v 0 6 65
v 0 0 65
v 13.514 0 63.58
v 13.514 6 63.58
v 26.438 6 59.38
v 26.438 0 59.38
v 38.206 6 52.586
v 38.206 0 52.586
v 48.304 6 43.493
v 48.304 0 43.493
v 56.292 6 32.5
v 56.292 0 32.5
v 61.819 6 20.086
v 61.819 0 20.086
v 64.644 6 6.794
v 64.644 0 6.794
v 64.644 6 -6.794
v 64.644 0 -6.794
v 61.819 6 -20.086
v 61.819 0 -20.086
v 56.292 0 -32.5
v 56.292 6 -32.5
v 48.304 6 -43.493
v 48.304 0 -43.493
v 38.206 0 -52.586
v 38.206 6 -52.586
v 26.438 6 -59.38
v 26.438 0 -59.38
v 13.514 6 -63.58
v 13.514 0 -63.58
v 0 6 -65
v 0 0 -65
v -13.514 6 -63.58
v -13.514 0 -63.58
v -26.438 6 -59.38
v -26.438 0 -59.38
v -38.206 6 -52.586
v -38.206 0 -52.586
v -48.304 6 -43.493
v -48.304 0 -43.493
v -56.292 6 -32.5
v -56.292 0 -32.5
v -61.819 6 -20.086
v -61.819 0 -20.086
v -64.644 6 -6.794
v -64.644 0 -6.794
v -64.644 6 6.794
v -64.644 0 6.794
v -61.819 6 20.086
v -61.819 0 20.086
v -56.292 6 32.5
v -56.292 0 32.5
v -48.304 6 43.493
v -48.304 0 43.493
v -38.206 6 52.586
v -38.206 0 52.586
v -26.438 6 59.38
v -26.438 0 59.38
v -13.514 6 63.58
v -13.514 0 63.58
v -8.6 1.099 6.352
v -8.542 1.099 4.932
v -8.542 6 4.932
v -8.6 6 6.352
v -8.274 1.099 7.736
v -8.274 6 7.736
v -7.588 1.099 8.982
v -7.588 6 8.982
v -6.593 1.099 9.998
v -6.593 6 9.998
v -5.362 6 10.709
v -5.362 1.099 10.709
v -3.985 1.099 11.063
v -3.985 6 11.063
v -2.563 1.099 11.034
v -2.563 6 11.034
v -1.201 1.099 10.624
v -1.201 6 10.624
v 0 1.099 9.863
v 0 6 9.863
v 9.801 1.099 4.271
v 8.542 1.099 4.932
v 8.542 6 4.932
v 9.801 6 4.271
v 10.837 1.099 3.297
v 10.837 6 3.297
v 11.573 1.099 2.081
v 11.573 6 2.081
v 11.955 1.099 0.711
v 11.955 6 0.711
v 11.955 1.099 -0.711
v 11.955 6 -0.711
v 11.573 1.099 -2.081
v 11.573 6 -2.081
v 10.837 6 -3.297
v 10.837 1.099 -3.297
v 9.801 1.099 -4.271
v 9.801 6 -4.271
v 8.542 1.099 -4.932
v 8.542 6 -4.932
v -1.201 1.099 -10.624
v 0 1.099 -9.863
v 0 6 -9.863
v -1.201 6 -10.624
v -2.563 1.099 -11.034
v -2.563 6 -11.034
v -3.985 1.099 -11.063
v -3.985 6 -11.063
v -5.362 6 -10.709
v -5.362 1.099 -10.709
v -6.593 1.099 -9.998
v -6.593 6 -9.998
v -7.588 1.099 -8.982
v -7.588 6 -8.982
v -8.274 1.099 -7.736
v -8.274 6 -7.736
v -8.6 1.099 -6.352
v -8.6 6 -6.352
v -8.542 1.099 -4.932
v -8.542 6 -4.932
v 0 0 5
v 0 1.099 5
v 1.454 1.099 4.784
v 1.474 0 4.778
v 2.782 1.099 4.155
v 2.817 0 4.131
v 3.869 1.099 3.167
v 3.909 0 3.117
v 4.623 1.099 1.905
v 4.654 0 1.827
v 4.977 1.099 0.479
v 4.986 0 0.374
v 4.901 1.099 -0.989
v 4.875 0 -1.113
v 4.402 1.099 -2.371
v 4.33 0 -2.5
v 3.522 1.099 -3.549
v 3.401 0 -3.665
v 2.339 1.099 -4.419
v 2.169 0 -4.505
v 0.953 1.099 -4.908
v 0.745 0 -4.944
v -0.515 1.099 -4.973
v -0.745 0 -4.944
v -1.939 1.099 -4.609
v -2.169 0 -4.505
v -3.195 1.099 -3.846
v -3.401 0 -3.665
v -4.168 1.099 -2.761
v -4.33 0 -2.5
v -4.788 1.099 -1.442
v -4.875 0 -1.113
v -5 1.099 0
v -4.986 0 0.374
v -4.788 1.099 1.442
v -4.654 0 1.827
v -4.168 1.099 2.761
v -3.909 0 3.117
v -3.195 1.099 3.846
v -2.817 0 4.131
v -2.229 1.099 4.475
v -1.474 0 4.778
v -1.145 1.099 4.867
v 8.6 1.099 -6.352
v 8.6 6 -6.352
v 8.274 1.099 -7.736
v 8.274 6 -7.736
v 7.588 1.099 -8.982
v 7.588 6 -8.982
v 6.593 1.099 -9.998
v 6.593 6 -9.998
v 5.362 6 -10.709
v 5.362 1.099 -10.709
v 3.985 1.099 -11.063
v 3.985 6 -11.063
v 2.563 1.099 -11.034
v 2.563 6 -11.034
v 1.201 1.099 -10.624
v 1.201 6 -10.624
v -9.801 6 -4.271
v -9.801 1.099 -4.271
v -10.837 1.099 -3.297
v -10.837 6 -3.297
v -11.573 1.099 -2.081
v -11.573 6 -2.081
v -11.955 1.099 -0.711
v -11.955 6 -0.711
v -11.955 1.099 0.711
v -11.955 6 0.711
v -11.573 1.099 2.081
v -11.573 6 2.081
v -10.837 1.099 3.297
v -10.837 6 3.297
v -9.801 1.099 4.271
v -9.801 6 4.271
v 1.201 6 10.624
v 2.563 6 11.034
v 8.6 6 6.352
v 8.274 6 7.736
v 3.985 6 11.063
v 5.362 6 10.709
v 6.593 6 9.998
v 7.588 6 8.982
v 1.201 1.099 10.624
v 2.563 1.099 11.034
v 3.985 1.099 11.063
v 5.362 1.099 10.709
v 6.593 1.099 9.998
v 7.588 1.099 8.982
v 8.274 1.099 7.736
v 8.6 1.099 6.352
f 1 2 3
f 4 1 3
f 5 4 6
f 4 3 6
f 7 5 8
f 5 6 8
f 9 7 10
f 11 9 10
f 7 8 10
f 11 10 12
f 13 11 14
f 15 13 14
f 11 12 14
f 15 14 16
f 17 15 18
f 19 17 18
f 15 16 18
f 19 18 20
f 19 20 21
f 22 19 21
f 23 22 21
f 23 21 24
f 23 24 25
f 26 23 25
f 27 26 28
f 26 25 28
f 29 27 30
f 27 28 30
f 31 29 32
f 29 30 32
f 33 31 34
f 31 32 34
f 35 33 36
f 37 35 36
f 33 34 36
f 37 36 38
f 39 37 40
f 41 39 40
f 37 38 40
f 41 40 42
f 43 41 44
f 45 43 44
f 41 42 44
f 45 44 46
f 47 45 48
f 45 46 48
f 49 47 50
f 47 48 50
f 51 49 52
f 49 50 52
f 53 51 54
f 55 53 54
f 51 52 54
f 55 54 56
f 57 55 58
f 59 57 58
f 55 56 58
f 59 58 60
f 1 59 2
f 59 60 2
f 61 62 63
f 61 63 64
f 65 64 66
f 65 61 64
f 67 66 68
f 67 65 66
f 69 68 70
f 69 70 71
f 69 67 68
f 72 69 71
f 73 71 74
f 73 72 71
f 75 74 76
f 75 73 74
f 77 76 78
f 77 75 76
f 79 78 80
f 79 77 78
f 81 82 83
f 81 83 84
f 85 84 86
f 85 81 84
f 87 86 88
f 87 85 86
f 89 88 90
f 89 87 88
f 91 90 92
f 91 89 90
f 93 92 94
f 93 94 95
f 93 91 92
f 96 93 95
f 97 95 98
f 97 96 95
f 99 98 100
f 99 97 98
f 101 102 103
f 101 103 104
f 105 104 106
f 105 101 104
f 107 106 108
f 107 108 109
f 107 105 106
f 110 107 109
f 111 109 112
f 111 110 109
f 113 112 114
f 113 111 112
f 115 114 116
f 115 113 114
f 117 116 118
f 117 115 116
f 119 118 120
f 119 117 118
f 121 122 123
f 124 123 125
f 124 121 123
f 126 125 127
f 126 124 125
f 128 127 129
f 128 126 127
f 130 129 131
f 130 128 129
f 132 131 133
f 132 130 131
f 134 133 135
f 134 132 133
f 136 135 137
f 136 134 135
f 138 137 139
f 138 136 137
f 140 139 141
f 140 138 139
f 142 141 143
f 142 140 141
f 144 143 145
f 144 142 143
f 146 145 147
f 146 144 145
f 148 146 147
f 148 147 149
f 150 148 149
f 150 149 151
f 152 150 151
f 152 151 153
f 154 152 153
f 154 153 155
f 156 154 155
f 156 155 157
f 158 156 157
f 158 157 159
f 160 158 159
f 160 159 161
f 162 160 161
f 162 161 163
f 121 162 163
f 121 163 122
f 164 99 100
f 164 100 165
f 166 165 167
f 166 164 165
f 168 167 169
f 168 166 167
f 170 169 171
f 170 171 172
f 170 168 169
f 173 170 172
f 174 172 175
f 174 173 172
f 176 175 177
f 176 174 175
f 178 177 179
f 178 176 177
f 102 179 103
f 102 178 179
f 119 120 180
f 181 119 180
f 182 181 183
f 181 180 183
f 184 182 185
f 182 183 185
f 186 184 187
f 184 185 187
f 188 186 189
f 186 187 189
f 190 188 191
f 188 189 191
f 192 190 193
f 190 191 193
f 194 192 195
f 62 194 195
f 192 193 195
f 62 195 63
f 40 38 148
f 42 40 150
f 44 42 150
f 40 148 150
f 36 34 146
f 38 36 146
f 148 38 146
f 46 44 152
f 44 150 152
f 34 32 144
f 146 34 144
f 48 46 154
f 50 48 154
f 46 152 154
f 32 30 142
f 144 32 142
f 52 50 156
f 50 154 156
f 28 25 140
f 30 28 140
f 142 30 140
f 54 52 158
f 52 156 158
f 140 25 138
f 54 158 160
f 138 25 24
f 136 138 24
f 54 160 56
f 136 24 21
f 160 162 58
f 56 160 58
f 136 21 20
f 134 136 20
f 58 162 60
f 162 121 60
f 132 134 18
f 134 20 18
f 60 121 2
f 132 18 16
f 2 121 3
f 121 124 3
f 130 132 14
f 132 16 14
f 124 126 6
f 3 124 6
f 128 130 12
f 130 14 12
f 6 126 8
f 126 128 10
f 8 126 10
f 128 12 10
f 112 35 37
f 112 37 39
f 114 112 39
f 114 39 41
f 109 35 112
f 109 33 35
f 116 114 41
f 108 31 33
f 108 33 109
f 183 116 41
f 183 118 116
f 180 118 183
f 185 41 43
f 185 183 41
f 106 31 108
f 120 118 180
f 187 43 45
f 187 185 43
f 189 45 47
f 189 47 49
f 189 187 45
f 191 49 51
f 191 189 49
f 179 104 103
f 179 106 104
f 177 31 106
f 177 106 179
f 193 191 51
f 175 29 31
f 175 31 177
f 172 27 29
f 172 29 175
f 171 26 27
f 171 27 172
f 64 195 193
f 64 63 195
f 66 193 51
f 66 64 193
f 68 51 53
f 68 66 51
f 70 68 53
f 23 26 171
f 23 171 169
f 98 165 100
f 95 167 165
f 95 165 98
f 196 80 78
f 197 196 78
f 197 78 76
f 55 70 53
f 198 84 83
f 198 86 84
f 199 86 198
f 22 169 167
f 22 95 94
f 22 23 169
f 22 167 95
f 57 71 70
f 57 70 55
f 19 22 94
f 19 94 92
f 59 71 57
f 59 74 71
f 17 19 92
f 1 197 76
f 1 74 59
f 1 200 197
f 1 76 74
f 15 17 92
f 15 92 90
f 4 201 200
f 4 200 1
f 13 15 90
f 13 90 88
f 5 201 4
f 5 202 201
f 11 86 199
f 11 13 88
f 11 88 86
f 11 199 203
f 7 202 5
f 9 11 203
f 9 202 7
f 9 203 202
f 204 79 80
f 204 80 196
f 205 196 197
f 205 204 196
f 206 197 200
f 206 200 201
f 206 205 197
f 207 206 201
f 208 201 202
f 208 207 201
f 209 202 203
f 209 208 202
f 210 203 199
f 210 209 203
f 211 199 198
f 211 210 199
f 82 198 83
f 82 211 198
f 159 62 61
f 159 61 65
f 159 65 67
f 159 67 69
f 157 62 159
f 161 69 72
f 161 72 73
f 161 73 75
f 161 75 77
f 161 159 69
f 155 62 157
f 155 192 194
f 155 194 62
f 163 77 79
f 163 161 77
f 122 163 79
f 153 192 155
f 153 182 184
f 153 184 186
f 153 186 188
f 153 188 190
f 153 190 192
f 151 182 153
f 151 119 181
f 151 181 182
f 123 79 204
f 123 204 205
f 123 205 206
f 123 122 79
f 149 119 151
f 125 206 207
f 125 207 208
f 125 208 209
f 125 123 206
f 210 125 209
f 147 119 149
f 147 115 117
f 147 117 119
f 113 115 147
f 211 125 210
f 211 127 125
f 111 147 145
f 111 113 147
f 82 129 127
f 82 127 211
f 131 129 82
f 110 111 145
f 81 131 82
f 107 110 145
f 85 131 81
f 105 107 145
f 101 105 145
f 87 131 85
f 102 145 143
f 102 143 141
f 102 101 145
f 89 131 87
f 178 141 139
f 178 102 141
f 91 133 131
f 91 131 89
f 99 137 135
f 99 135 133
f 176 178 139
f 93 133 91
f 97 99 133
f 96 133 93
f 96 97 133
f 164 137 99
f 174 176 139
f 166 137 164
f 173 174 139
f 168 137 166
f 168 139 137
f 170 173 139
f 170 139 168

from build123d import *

# Parameters (mm, degrees)
SKETCH1_R           = 65
BOSS_EXTRUDE1_DEPTH = 6
SKETCH2_R           = 5
CUT_EXTRUDE1_DEPTH  = 93.119487623
SKETCH3_R           = 5.243686523
CUT_EXTRUDE2_DEPTH  = 4.90143592
CIRPATTERN1_COUNT   = 6


with BuildPart() as part:
    # Sketch1 → Boss-Extrude1 (new body)
    with BuildSketch(Plane(origin=(0, 0, 0), x_dir=(1, 0, 0), z_dir=(0, 1, 0))):
        Circle(SKETCH1_R)
    extrude(amount=BOSS_EXTRUDE1_DEPTH)

    # Sketch2 → Cut-Extrude1 (cut, through all)
    with BuildSketch(Plane(origin=(0, 0, 0), x_dir=(1, 0, 0), z_dir=(0, 1, 0))):
        Circle(SKETCH2_R)
    extrude(amount=CUT_EXTRUDE1_DEPTH, mode=Mode.SUBTRACT)

    # Sketch3 → Cut-Extrude2 (cut)
    with BuildSketch(Plane(origin=(0, 6, 0), x_dir=(1, 0, 0), z_dir=(0, 1, 0))):
        with Locations((-6.759613597, 0)):
            Circle(SKETCH3_R)
    cut_extrude2 = extrude(amount=-CUT_EXTRUDE2_DEPTH, mode=Mode.SUBTRACT)

    # CirPattern1: Cut-Extrude2 ×6 about axis
    cirpattern1_axis = Axis((0, 0, 0), (0, 1, 0))
    for i in range(1, CIRPATTERN1_COUNT):
        add(cut_extrude2.rotate(cirpattern1_axis, i * 360 / CIRPATTERN1_COUNT), mode=Mode.SUBTRACT)


solid = part.part
